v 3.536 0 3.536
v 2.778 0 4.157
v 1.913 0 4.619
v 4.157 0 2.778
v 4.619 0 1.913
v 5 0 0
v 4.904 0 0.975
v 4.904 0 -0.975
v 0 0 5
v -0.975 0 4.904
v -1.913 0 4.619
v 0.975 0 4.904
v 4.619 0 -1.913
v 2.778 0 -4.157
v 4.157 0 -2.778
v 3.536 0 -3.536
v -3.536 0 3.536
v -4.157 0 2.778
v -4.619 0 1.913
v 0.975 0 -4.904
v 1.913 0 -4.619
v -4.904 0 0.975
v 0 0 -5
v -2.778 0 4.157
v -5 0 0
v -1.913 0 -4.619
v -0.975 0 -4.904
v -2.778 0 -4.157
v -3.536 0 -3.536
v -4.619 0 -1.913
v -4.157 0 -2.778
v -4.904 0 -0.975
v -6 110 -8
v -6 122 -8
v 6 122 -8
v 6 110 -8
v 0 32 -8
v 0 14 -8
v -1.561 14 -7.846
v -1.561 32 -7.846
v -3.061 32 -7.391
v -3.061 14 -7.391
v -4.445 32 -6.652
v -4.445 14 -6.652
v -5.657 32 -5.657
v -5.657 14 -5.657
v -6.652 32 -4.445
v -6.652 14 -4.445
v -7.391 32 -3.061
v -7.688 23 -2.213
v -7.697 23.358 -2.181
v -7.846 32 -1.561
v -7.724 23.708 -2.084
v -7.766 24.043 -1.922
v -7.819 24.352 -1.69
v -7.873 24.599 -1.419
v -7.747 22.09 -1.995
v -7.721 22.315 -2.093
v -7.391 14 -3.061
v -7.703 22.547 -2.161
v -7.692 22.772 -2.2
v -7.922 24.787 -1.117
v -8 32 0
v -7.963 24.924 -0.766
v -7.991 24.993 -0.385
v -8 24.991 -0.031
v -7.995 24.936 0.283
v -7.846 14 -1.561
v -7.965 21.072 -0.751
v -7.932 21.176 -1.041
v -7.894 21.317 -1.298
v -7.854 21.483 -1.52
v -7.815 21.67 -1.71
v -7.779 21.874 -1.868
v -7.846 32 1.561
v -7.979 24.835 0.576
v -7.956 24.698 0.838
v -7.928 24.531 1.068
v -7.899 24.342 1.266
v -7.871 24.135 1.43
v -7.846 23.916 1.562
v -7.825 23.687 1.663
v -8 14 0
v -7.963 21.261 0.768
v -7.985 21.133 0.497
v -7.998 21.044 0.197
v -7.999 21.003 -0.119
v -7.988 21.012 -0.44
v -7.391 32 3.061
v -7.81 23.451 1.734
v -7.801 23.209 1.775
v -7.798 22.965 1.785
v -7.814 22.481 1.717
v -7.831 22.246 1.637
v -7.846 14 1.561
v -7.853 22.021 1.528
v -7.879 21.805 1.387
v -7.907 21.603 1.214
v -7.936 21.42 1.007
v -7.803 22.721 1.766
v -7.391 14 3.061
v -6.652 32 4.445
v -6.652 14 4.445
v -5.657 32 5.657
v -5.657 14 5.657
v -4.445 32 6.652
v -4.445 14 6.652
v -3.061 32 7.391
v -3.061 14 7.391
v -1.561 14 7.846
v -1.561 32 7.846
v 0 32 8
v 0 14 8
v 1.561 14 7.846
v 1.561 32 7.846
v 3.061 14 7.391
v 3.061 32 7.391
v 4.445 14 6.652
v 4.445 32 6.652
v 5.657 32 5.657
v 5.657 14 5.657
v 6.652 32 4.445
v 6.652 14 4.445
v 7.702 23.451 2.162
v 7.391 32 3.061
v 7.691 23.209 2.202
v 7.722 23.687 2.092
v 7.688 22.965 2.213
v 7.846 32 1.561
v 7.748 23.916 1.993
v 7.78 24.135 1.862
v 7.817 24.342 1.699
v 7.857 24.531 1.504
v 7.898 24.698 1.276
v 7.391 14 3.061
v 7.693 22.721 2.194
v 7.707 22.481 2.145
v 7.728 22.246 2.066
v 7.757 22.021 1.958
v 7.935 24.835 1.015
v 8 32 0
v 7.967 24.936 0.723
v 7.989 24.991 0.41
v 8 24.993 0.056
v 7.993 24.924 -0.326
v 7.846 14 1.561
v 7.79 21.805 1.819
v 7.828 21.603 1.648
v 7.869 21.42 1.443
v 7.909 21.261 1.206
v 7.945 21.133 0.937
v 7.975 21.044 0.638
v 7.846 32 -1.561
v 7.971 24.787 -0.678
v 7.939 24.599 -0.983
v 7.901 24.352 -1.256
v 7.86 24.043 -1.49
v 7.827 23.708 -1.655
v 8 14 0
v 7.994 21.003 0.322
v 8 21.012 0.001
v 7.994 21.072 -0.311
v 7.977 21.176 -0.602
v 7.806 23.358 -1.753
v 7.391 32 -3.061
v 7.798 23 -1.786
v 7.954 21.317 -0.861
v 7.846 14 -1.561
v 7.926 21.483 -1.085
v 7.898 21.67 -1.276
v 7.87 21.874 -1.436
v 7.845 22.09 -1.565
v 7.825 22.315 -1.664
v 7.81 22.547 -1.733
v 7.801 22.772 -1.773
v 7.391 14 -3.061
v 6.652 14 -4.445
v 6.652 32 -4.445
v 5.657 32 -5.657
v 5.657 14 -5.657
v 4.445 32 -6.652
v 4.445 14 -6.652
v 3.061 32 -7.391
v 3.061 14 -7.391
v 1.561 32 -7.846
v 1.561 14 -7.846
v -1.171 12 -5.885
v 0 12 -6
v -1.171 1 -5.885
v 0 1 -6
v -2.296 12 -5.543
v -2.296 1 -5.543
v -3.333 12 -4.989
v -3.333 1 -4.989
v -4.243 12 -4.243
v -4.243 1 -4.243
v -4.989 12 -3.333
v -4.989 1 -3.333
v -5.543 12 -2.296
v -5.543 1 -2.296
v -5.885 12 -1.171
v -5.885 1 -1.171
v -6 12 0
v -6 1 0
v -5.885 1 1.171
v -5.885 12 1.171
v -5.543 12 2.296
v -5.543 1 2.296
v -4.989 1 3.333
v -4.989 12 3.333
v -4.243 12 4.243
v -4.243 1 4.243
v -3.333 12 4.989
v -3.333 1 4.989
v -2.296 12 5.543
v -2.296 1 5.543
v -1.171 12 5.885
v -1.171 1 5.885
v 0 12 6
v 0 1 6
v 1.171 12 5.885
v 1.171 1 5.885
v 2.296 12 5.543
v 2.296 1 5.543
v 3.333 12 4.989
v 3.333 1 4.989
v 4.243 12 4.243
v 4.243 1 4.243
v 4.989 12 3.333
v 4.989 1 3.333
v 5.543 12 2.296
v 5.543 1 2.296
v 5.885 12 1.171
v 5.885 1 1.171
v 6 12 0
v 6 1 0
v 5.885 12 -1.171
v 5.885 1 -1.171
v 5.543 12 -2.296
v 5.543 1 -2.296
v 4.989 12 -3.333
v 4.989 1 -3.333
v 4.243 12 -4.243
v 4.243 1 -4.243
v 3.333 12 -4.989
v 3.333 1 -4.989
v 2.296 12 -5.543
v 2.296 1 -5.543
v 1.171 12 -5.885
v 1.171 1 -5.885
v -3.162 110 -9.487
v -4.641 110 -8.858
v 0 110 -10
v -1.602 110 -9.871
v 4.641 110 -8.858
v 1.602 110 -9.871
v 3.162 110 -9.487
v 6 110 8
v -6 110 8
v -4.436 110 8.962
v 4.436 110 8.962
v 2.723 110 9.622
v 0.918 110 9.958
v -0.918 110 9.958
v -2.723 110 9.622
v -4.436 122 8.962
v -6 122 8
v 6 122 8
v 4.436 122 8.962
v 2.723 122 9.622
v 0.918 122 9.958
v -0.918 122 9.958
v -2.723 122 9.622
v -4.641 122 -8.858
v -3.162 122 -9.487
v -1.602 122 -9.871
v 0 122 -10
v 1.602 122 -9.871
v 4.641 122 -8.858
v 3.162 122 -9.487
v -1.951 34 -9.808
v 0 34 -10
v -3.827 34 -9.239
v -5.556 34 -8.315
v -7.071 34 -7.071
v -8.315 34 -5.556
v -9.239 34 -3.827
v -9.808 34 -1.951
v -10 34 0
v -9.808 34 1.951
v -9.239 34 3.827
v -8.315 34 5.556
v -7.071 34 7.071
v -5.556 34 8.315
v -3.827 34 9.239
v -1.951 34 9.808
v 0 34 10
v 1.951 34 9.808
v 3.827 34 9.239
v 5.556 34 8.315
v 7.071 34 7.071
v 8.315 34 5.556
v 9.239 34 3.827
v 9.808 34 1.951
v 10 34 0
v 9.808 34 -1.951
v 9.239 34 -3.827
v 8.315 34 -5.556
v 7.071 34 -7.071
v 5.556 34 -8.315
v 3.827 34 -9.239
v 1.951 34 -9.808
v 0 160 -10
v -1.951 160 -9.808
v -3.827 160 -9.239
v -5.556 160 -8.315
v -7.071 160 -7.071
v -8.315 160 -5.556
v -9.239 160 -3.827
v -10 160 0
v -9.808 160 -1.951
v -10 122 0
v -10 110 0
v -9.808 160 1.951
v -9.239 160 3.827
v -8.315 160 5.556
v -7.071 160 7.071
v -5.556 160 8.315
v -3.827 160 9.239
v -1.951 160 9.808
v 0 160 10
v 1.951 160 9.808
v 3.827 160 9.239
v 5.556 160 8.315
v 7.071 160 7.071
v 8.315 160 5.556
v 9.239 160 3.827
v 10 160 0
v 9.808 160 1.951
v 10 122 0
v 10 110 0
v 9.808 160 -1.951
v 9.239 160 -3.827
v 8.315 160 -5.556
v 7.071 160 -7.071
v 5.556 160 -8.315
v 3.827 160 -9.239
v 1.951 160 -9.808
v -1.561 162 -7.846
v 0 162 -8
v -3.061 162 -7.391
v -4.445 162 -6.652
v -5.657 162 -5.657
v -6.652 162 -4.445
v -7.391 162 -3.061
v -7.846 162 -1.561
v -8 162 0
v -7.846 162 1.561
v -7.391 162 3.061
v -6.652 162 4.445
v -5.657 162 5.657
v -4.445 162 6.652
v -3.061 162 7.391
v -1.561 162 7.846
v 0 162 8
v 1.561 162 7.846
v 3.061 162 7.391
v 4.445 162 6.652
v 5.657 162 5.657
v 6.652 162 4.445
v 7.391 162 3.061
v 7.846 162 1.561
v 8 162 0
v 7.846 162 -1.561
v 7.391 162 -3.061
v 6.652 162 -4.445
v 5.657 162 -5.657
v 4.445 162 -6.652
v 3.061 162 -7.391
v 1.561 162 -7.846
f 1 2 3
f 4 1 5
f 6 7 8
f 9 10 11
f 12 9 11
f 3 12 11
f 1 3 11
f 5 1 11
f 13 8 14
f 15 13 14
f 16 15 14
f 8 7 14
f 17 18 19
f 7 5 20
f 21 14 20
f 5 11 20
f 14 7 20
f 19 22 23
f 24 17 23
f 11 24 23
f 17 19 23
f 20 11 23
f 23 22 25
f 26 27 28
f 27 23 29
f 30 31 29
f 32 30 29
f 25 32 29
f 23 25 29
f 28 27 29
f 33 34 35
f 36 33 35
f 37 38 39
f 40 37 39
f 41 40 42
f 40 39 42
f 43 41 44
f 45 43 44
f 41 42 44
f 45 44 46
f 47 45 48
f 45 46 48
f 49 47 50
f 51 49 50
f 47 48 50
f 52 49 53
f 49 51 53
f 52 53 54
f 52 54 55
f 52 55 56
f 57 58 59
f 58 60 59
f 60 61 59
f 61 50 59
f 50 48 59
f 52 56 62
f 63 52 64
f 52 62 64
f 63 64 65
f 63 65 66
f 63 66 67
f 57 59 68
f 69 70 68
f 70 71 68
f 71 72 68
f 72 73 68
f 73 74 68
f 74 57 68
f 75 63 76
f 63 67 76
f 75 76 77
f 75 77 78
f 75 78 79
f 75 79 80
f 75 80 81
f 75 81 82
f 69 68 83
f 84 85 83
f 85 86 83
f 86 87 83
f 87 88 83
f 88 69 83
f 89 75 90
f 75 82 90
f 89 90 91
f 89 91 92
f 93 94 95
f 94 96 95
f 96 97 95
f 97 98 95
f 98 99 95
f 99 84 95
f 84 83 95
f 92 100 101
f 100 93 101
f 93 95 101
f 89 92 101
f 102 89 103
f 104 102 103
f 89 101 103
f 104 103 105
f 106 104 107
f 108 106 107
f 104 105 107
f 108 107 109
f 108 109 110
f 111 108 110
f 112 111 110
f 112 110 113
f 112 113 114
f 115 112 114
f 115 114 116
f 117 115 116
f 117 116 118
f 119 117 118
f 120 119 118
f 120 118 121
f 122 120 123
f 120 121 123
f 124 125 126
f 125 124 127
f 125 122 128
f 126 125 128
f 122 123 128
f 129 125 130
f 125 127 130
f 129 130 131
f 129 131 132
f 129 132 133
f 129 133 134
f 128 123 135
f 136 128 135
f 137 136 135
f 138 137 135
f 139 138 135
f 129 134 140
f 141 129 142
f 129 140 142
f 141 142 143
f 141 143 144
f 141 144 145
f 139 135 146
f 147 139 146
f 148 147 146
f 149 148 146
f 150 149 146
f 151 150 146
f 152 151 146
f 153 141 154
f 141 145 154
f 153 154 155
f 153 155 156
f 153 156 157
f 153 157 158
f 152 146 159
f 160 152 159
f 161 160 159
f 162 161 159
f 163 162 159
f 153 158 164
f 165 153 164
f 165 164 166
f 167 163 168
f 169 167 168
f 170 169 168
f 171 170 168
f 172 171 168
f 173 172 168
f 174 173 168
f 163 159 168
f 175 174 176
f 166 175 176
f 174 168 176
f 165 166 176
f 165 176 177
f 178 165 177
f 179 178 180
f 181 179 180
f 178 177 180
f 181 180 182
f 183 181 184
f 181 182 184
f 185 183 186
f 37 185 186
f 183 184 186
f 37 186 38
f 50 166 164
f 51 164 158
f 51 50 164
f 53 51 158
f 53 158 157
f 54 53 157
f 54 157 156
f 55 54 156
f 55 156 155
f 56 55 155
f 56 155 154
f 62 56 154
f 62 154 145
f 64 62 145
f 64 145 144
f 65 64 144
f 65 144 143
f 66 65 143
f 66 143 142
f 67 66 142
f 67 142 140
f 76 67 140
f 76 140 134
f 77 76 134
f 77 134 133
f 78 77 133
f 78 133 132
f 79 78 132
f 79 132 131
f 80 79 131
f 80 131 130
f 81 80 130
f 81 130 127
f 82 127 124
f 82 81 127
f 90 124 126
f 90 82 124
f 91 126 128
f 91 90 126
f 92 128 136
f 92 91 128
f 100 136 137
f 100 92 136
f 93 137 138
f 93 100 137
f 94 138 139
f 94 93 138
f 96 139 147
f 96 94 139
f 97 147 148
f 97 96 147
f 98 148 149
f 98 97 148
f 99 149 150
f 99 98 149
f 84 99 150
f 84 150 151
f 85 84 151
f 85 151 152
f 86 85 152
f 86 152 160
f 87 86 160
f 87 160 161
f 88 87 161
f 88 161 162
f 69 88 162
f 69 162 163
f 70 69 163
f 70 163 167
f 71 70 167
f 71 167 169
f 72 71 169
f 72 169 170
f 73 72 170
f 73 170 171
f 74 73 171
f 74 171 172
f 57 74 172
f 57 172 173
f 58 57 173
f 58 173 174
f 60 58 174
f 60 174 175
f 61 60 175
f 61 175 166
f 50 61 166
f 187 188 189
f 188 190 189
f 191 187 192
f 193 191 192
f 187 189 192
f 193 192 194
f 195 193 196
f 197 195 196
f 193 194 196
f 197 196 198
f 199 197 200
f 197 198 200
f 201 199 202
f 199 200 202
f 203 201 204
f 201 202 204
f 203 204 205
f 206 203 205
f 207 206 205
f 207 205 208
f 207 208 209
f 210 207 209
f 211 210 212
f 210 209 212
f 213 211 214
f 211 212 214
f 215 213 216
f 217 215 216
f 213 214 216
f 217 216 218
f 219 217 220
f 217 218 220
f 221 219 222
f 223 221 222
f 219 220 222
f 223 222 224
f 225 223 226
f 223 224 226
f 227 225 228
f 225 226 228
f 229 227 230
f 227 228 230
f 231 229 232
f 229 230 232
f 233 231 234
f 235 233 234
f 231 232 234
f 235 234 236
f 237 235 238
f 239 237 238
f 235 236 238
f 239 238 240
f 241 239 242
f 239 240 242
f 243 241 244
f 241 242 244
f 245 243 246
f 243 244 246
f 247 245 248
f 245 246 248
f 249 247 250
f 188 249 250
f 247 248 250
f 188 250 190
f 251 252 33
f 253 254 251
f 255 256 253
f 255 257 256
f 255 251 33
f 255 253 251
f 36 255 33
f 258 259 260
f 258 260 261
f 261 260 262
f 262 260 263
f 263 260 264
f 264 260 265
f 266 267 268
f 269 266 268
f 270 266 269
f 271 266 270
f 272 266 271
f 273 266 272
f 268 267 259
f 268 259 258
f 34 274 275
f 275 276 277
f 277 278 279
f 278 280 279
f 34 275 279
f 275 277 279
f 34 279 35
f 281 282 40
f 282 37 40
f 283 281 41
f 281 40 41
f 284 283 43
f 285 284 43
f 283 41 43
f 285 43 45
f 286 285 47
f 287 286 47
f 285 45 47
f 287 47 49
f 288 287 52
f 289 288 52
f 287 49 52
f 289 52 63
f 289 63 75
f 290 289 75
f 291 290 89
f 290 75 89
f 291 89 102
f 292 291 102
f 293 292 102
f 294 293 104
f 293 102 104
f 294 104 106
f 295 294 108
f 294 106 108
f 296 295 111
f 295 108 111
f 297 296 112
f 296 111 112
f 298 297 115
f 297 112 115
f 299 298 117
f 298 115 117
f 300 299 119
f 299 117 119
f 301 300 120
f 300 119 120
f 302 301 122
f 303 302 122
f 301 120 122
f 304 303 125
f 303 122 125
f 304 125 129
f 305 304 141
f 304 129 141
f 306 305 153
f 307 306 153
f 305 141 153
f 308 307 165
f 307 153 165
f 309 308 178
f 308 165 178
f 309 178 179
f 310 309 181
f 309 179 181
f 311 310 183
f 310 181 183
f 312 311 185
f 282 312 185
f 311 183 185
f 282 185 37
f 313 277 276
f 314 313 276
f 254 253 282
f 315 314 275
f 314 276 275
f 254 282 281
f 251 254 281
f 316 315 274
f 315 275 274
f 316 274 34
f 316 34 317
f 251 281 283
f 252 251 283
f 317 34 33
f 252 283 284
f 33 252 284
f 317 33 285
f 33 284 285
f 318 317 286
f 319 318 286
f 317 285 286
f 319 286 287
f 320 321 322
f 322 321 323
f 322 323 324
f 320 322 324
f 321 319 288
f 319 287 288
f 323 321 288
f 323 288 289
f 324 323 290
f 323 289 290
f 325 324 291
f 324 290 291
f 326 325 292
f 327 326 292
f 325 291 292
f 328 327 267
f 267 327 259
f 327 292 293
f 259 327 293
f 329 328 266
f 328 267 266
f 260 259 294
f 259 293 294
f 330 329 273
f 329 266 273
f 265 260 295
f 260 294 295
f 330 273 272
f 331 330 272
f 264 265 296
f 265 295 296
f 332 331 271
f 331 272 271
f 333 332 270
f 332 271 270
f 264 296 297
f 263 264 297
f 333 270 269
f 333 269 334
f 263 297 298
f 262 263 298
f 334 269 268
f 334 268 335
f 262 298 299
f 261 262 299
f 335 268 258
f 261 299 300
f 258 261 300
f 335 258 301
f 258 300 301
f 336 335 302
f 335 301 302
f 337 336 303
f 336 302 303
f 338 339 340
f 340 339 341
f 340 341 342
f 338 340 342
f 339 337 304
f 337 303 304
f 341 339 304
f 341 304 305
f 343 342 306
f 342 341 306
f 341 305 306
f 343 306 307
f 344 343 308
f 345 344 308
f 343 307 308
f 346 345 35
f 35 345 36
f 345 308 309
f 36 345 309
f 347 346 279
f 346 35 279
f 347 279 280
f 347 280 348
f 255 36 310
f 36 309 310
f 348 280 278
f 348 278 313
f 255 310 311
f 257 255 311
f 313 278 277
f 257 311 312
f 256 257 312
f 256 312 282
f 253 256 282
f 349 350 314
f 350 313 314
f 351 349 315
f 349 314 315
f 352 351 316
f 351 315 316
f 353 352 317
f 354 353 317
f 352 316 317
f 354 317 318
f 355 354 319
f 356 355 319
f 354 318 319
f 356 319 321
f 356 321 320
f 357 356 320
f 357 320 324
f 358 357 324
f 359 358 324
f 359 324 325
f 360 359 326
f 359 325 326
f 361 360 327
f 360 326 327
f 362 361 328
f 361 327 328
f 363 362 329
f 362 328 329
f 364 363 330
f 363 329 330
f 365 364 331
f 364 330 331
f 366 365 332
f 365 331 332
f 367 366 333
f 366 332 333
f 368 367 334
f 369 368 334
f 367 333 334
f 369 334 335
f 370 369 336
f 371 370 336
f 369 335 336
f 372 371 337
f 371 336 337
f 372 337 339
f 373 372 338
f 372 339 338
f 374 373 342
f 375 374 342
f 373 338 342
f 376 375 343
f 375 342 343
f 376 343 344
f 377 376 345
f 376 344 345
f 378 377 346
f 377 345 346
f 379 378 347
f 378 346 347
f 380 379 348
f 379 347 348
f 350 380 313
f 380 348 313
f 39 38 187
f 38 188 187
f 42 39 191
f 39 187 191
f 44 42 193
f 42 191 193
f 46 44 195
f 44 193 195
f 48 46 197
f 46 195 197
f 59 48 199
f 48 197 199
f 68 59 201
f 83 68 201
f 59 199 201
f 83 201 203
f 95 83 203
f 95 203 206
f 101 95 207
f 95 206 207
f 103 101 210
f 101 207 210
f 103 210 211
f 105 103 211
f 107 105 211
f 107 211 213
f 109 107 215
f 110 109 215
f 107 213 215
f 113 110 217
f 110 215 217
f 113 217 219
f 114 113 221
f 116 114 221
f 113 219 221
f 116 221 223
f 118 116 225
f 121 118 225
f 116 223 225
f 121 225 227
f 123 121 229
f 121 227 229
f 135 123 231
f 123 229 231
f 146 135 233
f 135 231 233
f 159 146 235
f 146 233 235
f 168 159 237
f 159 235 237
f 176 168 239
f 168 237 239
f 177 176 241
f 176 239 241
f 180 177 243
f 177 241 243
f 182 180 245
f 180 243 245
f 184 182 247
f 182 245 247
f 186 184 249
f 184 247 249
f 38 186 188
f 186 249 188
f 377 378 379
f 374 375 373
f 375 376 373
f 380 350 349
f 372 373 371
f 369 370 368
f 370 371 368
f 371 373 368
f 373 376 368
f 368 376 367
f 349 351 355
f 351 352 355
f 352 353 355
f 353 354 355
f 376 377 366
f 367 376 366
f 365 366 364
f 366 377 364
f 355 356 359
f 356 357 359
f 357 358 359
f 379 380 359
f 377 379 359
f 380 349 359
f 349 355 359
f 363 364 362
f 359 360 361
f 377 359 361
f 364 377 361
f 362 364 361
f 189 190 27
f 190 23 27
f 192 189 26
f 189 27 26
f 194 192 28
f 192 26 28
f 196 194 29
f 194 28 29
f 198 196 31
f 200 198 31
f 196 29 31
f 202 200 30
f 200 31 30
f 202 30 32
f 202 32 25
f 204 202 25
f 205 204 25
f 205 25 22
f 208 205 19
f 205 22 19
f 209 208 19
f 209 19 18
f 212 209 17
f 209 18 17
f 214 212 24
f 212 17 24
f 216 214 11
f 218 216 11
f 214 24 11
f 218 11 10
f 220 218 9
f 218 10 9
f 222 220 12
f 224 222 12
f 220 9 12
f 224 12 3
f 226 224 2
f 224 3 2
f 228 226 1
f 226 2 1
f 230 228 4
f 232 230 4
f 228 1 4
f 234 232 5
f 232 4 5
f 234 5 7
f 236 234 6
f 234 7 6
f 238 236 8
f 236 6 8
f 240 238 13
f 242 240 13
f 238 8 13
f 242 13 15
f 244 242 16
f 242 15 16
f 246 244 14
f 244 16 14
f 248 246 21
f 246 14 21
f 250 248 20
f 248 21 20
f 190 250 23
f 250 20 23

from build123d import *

# Parameters (mm, degrees)
CUT_EXTRUDE_START        = -40
SKETCH_2_OUTSIDE_W       = 54.89
SKETCH_2_OUTSIDE_H       = 54.89
SKETCH_2_OUTSIDE_W_2     = 20
SKETCH_2_OUTSIDE_H_2     = 16
CUT_EXTRUDE_1_DEPTH      = 12
CUT_EXTRUDE_2_DEPTH      = 196.51214796
CUT_EXTRUDE_2_DEPTH_BACK = 196.51214796
SKETCH_3_R               = 2


with BuildPart() as part:
    # Эскиз1 → Повернуть1 (revolve)
    with BuildSketch(Plane.XY, mode=Mode.PRIVATE) as revolve_1_sk:
        Polygon((-6, 1), (-5, 0), (0, 0), (0, 162), (-8, 162), (-10, 160), (-10, 34), (-8, 32), (-8, 14), (-6, 12), align=None)
    revolve(revolve_1_sk.sketch.rotate(Axis((0, 0, 0), (0, 1, 0)), 270), axis=Axis((0, 0, 0), (0, 1, 0)))

    # Эскиз2 outside → Вырез-Вытянуть1 (cut)
    with BuildSketch(Plane(origin=(0, 162, 0), x_dir=(1, 0, 0), z_dir=(0, 1, 0)).offset(CUT_EXTRUDE_START)):
        Rectangle(SKETCH_2_OUTSIDE_W, SKETCH_2_OUTSIDE_H)
        Rectangle(SKETCH_2_OUTSIDE_W_2, SKETCH_2_OUTSIDE_H_2, mode=Mode.SUBTRACT)
    extrude(amount=-CUT_EXTRUDE_1_DEPTH, mode=Mode.SUBTRACT)

    # Эскиз3 → Вырез-Вытянуть2 (cut, two sides: drawn at the far end of the back side and taken through both)
    with BuildSketch(Plane(origin=(0, -33, 0), x_dir=(0.027583216315568815, 0, -0.9996195107027916), z_dir=(0.9996195107027916, 0, 0.027583216315568815)).offset(-CUT_EXTRUDE_2_DEPTH_BACK)):
        with Locations((0, 56)):
            Circle(SKETCH_3_R)
    extrude(amount=CUT_EXTRUDE_2_DEPTH + CUT_EXTRUDE_2_DEPTH_BACK, mode=Mode.SUBTRACT)


solid = part.part
